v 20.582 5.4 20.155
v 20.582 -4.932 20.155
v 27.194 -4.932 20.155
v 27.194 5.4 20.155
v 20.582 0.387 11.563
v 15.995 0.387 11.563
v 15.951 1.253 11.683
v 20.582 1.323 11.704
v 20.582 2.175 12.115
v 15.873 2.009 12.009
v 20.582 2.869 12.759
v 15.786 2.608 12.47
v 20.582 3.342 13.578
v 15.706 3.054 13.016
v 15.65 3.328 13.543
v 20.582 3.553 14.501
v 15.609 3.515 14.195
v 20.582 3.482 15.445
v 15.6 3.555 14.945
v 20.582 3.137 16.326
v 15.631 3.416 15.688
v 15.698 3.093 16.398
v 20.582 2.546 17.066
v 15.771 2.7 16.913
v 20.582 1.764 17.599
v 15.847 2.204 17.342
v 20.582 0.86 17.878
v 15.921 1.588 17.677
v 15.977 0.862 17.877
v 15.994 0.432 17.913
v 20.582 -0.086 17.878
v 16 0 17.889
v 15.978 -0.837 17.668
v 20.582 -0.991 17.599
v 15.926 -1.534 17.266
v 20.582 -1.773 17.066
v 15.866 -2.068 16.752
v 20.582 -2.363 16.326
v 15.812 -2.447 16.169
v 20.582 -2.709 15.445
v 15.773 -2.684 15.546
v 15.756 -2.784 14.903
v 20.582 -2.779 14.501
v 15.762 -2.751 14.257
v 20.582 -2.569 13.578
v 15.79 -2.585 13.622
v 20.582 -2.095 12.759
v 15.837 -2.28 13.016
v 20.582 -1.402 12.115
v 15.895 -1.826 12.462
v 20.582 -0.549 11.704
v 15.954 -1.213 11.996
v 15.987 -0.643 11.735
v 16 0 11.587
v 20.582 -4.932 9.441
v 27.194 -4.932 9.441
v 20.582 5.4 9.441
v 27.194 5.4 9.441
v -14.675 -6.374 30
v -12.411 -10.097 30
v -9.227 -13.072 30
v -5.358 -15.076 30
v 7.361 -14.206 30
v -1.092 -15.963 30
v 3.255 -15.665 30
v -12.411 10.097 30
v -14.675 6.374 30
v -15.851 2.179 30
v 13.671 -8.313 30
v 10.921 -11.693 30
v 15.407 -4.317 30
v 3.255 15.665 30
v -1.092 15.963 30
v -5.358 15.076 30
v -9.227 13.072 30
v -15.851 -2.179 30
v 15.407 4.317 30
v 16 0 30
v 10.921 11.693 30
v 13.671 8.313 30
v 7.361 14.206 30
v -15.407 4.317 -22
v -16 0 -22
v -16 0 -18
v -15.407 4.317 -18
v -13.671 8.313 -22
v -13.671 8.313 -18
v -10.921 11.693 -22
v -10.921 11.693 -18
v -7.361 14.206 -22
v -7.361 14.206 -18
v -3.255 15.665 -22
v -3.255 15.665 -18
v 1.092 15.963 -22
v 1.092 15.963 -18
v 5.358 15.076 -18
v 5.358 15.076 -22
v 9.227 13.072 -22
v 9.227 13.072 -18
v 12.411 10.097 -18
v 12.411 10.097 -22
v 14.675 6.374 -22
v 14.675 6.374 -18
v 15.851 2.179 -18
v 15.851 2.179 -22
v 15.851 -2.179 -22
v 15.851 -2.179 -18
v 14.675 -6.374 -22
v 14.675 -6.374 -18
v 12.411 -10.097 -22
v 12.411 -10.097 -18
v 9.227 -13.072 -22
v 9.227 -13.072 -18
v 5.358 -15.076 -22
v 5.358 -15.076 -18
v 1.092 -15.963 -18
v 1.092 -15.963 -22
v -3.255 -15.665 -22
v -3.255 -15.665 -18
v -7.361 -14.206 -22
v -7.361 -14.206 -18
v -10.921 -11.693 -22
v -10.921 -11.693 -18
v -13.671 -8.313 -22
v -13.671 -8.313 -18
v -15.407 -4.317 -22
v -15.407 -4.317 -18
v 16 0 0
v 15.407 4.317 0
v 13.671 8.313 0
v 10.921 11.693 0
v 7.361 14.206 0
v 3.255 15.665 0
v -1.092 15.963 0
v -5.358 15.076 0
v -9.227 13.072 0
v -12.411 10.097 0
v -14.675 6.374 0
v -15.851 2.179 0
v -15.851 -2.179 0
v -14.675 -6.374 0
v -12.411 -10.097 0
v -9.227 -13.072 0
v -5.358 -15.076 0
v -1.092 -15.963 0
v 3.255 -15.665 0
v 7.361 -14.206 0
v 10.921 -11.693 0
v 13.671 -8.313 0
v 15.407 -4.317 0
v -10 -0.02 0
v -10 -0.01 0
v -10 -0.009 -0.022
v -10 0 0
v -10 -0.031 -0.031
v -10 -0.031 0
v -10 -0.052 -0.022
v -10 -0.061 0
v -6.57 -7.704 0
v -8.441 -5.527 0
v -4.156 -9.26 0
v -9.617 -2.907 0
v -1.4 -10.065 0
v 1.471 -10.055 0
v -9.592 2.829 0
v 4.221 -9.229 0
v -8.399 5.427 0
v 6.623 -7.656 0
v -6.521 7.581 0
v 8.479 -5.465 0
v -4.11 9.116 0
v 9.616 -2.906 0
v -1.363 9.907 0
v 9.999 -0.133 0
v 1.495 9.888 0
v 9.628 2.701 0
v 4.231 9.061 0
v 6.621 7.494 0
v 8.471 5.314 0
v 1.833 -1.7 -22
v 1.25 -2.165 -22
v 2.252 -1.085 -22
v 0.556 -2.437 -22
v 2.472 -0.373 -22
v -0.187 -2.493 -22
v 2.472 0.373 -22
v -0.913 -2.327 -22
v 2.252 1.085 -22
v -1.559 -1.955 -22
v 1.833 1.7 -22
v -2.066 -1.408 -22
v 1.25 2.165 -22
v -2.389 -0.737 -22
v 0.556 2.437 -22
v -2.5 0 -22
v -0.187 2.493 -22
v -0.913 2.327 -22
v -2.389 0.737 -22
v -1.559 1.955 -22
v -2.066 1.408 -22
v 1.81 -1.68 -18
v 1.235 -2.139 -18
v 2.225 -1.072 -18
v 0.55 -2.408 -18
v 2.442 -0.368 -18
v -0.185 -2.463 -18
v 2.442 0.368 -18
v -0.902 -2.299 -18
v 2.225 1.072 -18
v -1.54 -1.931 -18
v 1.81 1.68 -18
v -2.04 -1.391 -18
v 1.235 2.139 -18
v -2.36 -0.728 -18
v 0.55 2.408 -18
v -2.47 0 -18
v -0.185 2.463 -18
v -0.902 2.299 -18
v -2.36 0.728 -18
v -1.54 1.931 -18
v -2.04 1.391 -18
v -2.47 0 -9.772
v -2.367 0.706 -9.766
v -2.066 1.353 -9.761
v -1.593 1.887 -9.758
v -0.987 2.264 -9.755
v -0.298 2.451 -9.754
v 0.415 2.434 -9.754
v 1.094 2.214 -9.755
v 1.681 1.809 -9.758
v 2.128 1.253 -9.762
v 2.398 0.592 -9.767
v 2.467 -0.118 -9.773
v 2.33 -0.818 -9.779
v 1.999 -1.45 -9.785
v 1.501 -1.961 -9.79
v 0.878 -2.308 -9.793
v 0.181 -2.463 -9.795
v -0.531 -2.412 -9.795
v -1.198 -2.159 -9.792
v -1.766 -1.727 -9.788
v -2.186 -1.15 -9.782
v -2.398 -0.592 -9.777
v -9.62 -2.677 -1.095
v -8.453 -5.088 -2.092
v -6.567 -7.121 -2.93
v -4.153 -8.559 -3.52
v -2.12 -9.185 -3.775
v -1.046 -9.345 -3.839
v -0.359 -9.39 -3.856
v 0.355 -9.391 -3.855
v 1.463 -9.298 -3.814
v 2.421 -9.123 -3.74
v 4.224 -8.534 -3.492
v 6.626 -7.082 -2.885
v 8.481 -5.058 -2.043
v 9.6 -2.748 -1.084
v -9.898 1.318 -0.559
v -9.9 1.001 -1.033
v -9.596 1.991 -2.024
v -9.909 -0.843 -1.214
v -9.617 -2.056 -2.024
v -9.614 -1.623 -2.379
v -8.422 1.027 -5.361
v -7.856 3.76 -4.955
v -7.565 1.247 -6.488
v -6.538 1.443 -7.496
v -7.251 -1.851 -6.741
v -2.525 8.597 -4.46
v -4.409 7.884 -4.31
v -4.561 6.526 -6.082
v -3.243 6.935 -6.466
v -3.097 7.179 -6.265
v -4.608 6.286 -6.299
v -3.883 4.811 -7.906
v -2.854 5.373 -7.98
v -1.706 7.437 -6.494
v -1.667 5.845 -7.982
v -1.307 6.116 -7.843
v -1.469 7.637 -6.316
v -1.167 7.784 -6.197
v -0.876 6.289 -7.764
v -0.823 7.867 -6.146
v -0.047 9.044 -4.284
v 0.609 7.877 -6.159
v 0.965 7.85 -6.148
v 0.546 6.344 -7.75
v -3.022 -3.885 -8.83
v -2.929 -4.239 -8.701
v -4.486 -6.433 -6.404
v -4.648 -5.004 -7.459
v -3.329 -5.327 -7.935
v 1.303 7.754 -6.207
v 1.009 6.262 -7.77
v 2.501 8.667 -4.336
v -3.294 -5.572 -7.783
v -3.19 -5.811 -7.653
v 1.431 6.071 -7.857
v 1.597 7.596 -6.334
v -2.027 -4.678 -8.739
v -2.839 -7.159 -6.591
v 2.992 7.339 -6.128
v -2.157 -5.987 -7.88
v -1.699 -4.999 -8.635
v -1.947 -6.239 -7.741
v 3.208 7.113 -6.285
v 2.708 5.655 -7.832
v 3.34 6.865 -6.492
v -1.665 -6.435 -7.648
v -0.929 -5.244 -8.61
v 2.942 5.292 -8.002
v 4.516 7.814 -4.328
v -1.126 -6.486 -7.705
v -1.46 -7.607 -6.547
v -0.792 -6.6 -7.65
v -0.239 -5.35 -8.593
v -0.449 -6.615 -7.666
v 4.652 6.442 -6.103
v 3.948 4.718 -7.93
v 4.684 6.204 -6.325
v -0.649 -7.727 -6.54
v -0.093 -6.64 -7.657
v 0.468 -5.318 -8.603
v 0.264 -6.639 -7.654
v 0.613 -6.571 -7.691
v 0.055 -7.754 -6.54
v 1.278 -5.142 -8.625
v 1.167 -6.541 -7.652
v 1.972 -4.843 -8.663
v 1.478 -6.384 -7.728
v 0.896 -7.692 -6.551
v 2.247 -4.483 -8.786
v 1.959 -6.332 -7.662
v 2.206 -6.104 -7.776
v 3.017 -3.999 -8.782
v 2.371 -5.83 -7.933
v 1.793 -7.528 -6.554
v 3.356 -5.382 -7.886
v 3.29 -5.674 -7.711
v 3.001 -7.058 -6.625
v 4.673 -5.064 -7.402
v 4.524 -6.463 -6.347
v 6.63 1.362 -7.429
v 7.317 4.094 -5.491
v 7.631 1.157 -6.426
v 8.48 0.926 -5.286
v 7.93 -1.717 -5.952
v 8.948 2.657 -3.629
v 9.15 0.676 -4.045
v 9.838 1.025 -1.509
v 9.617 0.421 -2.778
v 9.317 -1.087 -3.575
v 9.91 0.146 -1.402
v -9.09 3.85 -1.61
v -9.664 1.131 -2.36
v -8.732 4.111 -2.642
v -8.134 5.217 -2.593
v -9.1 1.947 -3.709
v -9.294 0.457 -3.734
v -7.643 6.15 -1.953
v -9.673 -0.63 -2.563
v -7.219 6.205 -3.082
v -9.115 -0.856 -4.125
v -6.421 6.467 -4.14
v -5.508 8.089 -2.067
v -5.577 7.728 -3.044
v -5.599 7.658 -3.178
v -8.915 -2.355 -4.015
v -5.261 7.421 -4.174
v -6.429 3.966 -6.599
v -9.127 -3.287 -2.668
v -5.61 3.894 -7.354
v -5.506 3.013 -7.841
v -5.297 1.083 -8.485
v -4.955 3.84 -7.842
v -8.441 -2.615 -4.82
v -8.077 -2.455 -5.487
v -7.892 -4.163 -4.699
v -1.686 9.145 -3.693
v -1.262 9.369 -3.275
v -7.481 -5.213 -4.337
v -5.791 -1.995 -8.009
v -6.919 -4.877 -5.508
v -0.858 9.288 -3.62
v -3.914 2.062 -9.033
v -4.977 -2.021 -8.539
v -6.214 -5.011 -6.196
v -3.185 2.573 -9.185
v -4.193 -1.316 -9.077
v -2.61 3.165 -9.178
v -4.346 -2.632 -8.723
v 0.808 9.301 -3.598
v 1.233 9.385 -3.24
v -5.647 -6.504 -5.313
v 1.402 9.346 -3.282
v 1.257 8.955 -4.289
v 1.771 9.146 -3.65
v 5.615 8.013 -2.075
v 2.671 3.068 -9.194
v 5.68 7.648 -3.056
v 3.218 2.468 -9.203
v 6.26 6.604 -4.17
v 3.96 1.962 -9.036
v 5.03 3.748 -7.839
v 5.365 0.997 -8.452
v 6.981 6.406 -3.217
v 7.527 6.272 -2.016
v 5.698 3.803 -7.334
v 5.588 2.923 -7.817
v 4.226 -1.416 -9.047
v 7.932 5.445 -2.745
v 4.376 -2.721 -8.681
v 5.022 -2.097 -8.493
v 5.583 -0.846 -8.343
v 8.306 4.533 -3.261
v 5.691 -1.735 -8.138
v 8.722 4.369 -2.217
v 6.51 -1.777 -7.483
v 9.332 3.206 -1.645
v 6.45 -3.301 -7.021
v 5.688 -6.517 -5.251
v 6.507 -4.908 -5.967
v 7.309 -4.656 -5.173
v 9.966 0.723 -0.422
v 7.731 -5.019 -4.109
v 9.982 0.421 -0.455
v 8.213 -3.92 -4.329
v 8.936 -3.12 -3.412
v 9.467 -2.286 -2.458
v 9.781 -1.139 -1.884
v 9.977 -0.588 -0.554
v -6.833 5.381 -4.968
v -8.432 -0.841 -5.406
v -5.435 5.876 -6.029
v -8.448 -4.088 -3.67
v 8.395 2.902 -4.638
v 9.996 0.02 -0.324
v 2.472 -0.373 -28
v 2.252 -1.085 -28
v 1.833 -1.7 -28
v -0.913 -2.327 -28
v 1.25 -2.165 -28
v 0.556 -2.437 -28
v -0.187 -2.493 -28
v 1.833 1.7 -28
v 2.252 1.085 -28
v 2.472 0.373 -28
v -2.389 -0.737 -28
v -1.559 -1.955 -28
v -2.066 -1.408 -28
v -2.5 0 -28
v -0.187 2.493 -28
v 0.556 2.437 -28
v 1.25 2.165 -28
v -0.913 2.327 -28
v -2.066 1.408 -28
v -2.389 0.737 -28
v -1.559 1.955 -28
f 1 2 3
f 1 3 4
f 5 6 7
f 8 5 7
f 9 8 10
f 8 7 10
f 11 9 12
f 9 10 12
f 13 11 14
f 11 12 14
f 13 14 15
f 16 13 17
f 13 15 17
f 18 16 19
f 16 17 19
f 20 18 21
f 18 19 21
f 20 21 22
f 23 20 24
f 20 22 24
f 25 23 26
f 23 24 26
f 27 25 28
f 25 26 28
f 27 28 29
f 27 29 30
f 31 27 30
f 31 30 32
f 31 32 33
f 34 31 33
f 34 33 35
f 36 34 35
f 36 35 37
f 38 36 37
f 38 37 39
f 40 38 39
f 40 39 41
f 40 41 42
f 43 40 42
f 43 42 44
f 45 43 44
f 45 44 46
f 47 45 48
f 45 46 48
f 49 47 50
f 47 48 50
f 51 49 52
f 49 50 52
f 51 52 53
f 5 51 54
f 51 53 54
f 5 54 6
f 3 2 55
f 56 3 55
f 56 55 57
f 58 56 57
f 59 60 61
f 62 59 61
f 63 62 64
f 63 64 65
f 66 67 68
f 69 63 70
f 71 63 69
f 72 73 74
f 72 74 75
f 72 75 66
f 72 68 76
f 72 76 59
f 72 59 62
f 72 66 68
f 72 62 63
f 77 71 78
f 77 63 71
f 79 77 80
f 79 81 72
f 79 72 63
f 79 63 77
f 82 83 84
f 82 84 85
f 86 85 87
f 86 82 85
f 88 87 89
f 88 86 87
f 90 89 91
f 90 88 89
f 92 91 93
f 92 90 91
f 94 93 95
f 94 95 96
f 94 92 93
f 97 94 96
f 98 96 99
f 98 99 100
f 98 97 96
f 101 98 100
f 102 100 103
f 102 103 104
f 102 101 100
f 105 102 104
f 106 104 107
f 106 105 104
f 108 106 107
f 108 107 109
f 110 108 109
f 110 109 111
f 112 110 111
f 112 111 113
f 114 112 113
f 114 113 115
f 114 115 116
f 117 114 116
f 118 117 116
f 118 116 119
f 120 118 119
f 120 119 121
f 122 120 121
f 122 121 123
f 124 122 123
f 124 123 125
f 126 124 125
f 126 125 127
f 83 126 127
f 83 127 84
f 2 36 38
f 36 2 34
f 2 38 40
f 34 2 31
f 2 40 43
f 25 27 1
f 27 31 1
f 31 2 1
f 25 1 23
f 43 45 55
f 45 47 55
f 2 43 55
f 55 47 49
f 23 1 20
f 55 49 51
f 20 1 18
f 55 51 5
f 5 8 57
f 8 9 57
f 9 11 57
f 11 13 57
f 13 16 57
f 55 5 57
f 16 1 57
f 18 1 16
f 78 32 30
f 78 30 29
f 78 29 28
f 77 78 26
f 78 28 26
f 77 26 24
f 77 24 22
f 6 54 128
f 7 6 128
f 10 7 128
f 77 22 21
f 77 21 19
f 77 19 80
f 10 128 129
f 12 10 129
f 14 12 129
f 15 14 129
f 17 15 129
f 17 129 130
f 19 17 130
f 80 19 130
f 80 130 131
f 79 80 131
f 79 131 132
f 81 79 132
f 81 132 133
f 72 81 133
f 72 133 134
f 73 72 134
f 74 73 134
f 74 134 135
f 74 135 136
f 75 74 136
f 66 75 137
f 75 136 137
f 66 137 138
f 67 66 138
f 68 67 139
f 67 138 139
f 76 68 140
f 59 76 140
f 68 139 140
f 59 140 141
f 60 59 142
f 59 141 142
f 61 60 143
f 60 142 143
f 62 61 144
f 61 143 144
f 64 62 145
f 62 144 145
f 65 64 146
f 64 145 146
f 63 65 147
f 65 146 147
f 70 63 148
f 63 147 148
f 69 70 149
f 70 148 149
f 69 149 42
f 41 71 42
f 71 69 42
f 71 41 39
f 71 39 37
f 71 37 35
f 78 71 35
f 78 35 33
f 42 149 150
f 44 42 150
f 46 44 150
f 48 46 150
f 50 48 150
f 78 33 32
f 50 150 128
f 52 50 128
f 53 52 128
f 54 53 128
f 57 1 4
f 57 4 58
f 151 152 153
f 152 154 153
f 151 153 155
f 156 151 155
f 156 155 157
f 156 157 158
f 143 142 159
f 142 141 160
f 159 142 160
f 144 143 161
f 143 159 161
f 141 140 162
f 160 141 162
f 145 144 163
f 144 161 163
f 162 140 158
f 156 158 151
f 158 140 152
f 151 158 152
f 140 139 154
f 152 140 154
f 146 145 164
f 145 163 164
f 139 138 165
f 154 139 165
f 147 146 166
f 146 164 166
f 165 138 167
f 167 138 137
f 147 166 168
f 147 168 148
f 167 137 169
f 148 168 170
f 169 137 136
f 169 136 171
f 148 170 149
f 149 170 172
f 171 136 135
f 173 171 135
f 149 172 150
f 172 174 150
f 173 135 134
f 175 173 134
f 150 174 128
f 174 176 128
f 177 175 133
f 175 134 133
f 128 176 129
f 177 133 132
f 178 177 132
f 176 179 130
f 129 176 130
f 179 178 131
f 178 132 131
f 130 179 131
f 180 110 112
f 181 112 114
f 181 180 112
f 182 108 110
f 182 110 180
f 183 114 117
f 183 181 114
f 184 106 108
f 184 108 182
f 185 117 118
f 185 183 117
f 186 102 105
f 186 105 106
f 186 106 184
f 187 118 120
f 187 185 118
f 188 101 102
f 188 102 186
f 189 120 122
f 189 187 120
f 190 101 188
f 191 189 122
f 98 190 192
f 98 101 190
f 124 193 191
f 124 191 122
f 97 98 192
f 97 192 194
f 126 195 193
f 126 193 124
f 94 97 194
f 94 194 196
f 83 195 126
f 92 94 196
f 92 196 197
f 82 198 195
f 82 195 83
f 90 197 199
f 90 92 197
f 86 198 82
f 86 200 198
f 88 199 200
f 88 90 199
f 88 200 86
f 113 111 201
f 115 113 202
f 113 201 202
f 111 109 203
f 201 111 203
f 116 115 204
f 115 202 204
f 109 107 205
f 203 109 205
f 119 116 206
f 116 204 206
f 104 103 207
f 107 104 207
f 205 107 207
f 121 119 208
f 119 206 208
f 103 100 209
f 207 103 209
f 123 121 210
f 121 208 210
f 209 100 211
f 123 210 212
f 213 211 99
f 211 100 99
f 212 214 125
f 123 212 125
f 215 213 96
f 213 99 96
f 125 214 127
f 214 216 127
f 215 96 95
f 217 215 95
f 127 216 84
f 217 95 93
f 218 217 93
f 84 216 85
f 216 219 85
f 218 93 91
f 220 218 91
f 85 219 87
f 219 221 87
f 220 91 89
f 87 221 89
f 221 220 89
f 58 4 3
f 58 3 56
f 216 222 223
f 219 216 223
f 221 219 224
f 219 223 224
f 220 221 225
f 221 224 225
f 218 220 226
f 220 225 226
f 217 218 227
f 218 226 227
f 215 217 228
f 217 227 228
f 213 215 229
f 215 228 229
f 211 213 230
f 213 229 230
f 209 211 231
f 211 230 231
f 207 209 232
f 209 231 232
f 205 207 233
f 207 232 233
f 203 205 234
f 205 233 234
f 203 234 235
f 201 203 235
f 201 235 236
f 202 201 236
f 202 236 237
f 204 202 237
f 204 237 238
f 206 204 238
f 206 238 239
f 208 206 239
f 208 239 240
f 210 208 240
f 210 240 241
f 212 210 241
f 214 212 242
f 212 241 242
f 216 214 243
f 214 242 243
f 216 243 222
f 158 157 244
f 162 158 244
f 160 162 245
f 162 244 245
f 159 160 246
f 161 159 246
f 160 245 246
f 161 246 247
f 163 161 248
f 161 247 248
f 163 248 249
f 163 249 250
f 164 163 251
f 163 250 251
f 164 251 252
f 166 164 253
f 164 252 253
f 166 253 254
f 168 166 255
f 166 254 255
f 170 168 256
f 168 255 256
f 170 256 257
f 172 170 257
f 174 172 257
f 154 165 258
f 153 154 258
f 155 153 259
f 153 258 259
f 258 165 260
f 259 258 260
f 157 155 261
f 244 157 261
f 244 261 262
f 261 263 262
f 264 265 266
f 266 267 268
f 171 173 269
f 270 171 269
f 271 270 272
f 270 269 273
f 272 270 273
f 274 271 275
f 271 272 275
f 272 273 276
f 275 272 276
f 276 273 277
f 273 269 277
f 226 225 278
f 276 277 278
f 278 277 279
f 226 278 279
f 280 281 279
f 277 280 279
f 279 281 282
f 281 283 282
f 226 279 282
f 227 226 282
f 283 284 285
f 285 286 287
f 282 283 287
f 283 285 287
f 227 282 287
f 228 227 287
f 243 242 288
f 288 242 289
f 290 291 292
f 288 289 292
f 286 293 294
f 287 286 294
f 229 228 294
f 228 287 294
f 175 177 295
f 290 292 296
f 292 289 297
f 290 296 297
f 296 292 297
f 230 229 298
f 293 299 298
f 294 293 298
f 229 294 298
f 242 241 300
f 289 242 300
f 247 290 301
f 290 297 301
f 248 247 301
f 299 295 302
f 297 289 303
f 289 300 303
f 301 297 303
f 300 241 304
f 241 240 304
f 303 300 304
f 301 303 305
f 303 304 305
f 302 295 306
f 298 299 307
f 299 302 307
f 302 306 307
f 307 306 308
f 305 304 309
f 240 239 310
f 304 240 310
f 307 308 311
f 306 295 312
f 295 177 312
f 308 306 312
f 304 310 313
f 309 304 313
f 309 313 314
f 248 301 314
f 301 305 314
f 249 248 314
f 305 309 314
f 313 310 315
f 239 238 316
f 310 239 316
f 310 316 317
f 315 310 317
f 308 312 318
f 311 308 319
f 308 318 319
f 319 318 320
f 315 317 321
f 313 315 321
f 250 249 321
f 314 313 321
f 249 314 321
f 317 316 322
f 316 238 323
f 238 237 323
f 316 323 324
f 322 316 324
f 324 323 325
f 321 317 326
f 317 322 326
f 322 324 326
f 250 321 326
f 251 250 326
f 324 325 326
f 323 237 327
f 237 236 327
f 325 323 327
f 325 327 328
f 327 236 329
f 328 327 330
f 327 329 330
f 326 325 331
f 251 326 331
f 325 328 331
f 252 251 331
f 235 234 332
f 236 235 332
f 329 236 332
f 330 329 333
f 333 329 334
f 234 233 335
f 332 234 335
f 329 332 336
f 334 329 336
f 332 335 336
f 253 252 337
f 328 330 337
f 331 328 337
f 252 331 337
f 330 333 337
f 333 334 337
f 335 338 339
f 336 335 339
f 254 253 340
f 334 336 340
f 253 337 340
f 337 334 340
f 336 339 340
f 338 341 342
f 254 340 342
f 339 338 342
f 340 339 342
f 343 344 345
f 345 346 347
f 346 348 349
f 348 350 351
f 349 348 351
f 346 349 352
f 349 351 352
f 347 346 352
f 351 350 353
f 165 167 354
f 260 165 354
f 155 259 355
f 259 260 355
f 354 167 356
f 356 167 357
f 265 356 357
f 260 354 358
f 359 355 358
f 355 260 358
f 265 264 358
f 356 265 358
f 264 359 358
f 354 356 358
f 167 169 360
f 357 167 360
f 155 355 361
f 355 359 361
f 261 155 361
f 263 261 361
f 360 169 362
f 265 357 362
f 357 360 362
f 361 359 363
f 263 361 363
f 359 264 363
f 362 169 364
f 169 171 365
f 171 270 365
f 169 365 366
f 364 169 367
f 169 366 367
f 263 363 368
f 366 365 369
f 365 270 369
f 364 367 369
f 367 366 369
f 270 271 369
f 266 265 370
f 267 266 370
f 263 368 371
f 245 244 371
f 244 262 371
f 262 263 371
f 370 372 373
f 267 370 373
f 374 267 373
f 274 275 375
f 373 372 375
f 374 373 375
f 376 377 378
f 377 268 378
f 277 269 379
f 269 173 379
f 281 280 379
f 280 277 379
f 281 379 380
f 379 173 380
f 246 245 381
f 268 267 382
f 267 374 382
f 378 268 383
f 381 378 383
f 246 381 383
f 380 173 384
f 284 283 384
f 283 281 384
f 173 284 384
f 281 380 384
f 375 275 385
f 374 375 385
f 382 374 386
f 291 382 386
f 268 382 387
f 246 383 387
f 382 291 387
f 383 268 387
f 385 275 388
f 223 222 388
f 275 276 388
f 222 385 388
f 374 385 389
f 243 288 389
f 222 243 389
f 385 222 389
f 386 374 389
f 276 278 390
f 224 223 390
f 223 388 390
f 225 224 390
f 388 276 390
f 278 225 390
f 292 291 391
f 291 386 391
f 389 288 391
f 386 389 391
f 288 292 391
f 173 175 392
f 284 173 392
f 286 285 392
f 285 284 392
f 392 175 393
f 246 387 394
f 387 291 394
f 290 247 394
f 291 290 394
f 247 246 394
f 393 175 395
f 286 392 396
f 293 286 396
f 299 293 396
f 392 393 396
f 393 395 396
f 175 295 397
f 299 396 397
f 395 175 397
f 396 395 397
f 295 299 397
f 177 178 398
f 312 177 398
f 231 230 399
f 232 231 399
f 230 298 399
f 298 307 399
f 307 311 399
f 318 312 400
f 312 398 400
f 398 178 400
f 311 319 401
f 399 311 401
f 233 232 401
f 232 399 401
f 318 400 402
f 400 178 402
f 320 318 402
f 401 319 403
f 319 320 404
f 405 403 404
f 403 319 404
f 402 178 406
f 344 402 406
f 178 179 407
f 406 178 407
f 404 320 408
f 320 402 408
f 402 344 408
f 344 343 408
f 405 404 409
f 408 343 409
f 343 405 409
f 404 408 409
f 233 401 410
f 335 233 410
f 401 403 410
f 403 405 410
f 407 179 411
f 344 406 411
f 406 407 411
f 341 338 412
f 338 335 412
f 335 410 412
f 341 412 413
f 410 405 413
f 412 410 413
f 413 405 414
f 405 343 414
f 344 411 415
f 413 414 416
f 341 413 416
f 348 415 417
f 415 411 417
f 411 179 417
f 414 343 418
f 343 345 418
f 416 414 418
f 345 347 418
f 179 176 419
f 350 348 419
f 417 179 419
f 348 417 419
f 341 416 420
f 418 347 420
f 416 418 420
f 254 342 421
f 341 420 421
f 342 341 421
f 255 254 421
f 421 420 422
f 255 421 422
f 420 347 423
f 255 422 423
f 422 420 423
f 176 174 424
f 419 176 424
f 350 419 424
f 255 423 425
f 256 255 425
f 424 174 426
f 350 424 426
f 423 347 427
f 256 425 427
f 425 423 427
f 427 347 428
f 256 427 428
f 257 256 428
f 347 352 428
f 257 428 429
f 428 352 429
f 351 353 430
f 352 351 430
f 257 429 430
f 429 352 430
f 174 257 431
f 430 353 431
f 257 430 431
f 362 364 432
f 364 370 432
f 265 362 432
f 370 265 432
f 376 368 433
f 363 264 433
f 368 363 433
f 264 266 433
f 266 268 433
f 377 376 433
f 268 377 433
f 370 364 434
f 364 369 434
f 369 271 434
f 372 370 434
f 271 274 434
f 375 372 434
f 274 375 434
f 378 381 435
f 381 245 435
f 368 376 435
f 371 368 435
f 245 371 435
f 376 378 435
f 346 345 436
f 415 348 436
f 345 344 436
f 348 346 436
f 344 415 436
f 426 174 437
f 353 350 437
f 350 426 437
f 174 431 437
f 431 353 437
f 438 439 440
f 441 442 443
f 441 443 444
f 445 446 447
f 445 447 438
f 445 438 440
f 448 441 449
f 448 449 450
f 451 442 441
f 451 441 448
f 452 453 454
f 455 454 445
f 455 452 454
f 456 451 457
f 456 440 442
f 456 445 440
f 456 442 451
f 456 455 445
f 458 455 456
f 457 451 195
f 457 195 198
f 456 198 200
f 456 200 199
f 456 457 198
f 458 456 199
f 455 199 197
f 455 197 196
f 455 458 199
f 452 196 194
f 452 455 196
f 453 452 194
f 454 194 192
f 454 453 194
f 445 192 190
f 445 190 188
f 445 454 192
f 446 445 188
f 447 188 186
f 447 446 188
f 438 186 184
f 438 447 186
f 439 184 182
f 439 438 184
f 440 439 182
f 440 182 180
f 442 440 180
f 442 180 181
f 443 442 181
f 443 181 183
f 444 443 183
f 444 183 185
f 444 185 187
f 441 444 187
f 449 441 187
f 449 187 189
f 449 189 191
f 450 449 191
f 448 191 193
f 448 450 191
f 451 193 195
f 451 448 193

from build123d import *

# Parameters (mm, degrees)
SKETCH1_R               = 16
BOSS_EXTRUDE1_DEPTH     = 30
SKETCH2_R               = 3.175
BOSS_EXTRUDE2_DEPTH     = 20.582030842
SKETCH3_W               = 10.714658548
SKETCH3_H               = 10.331992171
BOSS_EXTRUDE3_DEPTH     = 6.612030842
SKETCH5_R               = 2.469573247
BOSS_EXTRUDE4_DEPTH     = 28
SKETCH6_R               = 16
BOSS_EXTRUDE5_DEPTH     = 10
SKETCH6_2_R             = 16
SKETCH6_2_R_2           = 2.5
CUT_EXTRUDE_THIN1_DEPTH = 6


with BuildPart() as part:
    # Sketch1 → Boss-Extrude1 (new body)
    with BuildSketch(Plane.XY):
        Circle(SKETCH1_R)
    extrude(amount=BOSS_EXTRUDE1_DEPTH)

    # Sketch2 → Boss-Extrude2 (add)
    with BuildSketch(Plane(origin=(0, 0, 0), x_dir=(0, 0, -1), z_dir=(1, 0, 0))):
        with Locations((-14.73814173, 0.386884617)):
            Circle(SKETCH2_R)
    extrude(amount=BOSS_EXTRUDE2_DEPTH)

    # Sketch3 → Boss-Extrude3 (add)
    with BuildSketch(Plane(origin=(20.582030842, 0, 0), x_dir=(0, 0, -1), z_dir=(1, 0, 0))):
        with Locations((-14.79803719, 0.233851674)):
            Rectangle(SKETCH3_W, SKETCH3_H)
    extrude(amount=BOSS_EXTRUDE3_DEPTH)

    # Sketch4 → Revolve1 (revolve)
    with BuildSketch(Plane(origin=(0, 0, 0), x_dir=(-1, 0, 0), z_dir=(0, 0, -1))):
        with BuildLine():
            ThreePointArc((10, 0), (-0.066566913, 9.99977844), (-9.999113769, -0.133130877))
            Line((-9.999113769, -0.133130877), (9.999952802, -0.030723799))
            ThreePointArc((9.999952802, -0.030723799), (9.999988201, -0.015361918), (10, 0))
        make_face()
    revolve(axis=Axis((15.849507962, -0.163088364, 0), (-0.9999868900221045, 0.005120525746398906, 0)))

    # Sketch5 → Boss-Extrude4 (add)
    with BuildSketch(Plane(origin=(0, 0, 0), x_dir=(-1, 0, 0), z_dir=(0, 0, -1))):
        Circle(SKETCH5_R)
    extrude(amount=BOSS_EXTRUDE4_DEPTH)

    # Sketch6 → Boss-Extrude5 (add)
    with BuildSketch(Plane(origin=(0, 0, -28), x_dir=(-1, 0, 0), z_dir=(0, 0, -1))):
        Circle(SKETCH6_R)
    extrude(amount=-BOSS_EXTRUDE5_DEPTH)

    # Sketch6<2> → Cut-Extrude-Thin1 (cut)
    with BuildSketch(Plane(origin=(0, 0, -28), x_dir=(-1, 0, 0), z_dir=(0, 0, -1))):
        Circle(SKETCH6_2_R)
        Circle(SKETCH6_2_R_2, mode=Mode.SUBTRACT)
    extrude(amount=-CUT_EXTRUDE_THIN1_DEPTH, mode=Mode.SUBTRACT)


solid = part.part
